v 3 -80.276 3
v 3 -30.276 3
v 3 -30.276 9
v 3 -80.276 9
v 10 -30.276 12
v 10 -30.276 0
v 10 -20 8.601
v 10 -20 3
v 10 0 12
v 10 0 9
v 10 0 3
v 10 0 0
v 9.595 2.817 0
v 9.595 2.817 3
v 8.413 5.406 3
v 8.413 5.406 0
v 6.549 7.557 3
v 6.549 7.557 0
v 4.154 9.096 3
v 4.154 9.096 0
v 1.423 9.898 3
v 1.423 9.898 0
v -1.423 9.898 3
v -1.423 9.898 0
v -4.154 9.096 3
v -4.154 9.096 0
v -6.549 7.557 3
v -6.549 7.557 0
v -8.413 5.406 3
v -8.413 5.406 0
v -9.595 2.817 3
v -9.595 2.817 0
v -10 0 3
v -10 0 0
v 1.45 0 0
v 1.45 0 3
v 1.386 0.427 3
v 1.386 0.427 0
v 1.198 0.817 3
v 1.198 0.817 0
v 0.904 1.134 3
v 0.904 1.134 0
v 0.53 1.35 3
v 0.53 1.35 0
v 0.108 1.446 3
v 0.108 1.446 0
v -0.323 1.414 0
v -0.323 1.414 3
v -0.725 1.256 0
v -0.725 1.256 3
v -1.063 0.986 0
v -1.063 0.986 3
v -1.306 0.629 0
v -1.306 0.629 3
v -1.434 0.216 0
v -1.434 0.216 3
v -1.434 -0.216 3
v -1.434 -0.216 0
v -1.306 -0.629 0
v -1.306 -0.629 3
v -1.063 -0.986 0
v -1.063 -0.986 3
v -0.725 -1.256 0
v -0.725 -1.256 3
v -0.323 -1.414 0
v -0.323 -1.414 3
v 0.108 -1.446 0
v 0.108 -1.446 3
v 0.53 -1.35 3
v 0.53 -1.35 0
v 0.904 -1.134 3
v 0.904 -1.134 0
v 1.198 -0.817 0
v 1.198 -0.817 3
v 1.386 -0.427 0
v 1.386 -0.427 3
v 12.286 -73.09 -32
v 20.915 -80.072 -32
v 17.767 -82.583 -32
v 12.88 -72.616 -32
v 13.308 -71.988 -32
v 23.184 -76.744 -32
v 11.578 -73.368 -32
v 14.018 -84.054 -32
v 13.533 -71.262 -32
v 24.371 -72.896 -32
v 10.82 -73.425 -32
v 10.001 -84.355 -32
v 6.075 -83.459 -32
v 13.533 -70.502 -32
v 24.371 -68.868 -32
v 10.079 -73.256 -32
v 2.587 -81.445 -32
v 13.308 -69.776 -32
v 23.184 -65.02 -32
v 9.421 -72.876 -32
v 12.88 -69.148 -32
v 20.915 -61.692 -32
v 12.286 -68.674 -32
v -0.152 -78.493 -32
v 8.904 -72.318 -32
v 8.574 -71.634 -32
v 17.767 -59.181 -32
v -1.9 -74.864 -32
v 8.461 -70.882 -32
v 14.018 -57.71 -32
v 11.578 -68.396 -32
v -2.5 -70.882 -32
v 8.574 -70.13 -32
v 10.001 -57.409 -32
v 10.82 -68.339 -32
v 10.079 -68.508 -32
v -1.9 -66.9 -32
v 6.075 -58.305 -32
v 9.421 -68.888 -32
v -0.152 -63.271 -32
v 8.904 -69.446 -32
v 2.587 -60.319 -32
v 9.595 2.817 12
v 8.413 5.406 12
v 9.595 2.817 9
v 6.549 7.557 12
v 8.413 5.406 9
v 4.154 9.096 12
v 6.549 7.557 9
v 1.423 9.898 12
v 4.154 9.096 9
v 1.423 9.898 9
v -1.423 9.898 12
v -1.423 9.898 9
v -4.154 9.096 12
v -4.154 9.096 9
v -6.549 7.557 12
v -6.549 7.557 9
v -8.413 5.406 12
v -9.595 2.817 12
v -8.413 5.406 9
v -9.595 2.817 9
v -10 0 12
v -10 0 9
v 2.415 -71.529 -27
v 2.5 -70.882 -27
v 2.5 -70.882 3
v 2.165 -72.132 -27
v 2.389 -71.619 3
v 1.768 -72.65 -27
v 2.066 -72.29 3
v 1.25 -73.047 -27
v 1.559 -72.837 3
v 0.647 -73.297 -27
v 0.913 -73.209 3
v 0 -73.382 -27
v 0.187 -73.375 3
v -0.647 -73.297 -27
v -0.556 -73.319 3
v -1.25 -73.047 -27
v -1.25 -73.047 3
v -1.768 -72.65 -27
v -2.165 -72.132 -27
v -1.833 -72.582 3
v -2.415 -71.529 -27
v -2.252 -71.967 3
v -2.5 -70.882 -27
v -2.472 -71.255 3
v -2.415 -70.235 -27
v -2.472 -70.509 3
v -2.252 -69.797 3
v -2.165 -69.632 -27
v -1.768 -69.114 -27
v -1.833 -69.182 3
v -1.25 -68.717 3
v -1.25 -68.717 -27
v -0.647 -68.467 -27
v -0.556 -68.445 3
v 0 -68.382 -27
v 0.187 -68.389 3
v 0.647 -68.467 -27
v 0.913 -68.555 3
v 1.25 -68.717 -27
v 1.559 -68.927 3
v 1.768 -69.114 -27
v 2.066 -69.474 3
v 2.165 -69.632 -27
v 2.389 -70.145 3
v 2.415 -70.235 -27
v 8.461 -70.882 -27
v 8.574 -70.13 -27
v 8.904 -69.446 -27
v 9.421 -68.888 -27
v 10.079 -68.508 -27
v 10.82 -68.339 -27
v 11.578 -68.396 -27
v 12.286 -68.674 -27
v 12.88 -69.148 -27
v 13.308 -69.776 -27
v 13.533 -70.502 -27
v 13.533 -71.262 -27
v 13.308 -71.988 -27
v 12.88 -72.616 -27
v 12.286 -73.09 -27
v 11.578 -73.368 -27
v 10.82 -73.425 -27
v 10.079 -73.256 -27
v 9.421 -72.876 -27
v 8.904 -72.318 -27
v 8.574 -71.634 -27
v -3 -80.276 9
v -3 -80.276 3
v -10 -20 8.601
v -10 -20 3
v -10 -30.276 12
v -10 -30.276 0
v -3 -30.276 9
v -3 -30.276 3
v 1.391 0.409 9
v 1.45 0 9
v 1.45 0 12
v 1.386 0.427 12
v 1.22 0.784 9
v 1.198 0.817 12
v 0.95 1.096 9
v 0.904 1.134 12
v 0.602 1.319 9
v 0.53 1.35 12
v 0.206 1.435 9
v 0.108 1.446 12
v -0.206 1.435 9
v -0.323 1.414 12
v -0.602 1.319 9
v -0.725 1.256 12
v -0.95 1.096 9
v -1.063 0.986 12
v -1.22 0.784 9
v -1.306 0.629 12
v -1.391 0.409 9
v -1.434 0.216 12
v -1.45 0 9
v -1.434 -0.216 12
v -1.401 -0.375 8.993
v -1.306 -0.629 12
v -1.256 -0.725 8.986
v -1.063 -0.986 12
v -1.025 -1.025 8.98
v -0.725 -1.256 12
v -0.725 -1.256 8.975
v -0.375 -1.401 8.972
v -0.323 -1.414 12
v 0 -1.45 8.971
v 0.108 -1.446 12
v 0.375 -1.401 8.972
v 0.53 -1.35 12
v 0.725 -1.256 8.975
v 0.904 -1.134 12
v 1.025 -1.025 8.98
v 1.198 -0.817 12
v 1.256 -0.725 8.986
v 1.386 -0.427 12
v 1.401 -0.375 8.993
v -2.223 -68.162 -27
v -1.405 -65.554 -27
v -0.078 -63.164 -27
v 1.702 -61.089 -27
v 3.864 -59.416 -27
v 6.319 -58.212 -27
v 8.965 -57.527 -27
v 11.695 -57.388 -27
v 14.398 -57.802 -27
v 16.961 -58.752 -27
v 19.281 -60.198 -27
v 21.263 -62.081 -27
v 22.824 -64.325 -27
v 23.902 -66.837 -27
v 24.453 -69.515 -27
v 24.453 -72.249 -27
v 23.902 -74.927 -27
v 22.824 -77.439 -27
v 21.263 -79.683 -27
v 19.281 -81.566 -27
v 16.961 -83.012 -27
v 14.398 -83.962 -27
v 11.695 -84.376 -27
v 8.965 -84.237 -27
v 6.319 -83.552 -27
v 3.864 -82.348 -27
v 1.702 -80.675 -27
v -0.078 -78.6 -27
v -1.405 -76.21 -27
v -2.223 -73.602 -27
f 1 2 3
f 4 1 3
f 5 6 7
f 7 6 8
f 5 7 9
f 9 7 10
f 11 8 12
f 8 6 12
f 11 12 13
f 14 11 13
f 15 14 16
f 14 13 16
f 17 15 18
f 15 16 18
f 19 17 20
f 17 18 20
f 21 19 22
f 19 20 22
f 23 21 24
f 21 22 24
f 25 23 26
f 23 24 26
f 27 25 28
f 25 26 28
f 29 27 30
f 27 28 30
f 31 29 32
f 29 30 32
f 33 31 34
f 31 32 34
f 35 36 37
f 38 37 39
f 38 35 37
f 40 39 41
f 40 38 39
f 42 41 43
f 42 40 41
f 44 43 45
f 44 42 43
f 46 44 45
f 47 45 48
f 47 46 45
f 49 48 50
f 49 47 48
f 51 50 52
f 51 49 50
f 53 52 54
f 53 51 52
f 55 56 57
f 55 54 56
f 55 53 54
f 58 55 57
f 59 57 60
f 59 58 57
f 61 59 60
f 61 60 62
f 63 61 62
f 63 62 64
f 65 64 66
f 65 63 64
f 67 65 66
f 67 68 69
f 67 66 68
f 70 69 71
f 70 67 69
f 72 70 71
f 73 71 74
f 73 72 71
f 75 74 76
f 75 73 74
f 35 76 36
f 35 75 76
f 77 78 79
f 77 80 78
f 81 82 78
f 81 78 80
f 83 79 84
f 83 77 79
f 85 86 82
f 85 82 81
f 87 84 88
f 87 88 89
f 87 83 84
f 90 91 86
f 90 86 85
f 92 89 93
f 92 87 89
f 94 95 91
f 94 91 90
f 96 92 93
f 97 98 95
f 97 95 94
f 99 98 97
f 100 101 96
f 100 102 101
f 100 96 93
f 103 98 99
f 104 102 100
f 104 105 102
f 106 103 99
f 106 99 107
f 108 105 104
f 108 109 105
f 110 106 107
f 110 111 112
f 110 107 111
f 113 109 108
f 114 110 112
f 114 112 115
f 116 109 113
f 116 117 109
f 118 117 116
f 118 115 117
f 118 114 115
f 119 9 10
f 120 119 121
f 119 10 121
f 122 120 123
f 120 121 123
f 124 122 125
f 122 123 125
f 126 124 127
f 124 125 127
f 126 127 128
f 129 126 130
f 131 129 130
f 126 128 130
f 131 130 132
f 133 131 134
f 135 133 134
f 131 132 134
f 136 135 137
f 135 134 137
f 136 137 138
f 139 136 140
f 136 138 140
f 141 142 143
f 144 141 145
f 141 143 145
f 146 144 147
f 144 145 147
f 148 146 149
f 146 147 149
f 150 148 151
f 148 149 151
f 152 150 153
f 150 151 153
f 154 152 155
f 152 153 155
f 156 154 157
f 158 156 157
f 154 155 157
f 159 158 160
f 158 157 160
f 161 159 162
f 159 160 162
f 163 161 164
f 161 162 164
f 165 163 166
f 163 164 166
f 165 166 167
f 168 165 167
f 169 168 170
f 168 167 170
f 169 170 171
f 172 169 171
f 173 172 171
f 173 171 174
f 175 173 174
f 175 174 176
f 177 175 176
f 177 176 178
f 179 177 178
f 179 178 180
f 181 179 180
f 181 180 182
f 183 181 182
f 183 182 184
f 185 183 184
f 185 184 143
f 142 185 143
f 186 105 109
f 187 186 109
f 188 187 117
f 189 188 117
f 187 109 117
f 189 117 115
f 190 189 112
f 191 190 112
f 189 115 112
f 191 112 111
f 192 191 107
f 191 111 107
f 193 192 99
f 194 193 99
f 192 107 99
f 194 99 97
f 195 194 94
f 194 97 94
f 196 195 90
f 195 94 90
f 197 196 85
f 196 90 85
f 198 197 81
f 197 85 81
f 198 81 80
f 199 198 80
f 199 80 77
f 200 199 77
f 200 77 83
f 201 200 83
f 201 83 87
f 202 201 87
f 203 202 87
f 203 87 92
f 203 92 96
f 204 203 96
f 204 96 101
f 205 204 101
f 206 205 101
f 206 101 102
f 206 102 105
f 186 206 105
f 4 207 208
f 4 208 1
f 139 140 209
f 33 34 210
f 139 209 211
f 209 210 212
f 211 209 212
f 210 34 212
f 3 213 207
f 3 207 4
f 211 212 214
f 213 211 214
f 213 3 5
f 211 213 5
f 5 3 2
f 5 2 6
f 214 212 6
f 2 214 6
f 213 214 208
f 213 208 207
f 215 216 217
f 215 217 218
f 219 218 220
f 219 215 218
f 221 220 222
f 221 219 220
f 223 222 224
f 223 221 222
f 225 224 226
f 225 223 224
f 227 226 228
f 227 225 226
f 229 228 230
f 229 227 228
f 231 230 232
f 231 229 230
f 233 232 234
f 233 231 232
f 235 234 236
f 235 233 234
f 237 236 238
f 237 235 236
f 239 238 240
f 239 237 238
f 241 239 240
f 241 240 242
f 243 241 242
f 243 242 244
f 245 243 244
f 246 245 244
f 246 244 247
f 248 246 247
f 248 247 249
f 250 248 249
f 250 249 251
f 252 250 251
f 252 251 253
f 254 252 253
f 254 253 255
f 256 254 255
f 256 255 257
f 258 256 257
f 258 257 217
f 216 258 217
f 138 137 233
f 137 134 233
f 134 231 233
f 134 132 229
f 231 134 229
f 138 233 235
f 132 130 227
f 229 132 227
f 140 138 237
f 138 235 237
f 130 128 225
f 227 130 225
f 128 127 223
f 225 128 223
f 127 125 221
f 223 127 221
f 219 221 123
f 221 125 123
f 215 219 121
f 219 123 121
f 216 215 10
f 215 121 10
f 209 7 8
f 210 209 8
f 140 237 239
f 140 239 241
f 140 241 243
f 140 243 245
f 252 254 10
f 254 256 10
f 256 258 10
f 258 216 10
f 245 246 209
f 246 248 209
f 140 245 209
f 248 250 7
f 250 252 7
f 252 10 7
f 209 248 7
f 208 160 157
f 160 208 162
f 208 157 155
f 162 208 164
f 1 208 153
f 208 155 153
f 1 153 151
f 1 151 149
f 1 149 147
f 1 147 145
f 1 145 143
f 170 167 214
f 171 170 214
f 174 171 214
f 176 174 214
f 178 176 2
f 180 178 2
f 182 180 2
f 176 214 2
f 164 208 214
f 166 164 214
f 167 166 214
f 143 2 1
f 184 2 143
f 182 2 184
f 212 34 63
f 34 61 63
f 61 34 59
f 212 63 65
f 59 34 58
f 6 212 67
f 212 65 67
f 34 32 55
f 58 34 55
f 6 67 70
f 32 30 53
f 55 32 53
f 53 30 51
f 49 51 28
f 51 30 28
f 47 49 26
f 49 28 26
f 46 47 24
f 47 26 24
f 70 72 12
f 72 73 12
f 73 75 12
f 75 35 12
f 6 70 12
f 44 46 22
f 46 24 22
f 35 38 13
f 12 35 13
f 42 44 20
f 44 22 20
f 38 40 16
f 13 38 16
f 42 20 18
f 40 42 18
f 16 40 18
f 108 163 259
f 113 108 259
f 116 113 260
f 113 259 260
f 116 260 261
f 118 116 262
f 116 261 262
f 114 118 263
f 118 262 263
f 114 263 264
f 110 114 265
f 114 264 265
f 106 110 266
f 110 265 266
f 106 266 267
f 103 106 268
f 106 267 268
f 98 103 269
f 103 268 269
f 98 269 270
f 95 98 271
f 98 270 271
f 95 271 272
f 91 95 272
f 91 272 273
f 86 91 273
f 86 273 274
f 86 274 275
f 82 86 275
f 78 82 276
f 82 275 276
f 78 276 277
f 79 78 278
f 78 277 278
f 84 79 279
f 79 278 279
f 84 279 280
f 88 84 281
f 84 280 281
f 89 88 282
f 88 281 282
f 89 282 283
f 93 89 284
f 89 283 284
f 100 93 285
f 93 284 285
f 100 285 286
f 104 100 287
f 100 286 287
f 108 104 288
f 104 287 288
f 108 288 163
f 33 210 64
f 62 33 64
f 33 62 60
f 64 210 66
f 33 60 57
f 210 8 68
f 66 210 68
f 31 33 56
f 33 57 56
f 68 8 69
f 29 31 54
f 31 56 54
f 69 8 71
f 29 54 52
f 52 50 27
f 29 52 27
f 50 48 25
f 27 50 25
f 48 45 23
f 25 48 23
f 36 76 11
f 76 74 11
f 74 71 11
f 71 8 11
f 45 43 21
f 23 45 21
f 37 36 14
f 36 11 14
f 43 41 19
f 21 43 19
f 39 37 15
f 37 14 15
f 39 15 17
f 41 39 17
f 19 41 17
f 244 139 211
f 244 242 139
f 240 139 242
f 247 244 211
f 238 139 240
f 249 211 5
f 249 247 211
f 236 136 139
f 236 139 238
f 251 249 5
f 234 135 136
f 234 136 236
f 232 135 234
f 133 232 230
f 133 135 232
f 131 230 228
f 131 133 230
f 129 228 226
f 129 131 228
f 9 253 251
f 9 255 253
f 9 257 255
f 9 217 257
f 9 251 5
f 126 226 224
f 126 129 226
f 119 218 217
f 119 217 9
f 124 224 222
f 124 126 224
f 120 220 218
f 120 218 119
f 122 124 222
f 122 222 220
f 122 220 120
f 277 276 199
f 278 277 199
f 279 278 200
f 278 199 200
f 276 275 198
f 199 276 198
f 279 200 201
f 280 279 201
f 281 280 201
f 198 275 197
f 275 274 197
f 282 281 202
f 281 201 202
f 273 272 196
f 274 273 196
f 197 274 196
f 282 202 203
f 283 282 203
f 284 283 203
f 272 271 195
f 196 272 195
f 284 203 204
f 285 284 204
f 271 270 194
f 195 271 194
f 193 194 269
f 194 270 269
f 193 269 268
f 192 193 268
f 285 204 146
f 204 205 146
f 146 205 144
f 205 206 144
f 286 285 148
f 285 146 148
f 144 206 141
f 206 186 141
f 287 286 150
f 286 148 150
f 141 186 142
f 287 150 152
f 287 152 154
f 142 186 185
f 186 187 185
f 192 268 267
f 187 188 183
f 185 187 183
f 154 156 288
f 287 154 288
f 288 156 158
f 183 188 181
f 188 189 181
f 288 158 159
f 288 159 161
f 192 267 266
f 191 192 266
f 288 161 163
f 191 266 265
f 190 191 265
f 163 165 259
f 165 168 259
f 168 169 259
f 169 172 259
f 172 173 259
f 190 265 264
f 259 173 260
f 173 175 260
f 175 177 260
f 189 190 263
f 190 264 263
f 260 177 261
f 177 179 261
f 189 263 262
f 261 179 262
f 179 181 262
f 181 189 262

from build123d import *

# Parameters (mm, degrees)
SKETCH_1_R          = 1.45
EXTRUDE_1_DEPTH     = 12
CUT_EXTRUDE_1_DEPTH = 39.218600963
SKETCH_3_W          = 6
SKETCH_3_H          = 6
EXTRUDE_5_DEPTH     = 50
EXTRUDE_6_DEPTH     = 30
SKETCH_9_R          = 13.511017451
EXTRUDE_10_DEPTH    = 5
SKETCH_10_R         = 2.55
CUT_EXTRUDE_5_DEPTH = 99.282815089


with BuildPart() as part:
    # 草圖1 → 填料-伸長1 (new body)
    with BuildSketch(Plane.XY):
        with BuildLine():
            Line((-10, 0), (-10, -30.276417548))
            Line((-10, -30.276417548), (10, -30.276417548))
            Line((10, -30.276417548), (10, 0))
            ThreePointArc((10, 0), (0, 10), (-10, 0))
        make_face()
        Circle(SKETCH_1_R, mode=Mode.SUBTRACT)
    extrude(amount=EXTRUDE_1_DEPTH)

    # 草圖2 → 除料-伸長1 (cut, through all)
    with BuildSketch(Plane(origin=(10, 0, 0), x_dir=(0, 0, -1), z_dir=(1, 0, 0))):
        Polygon((-9, 0), (-6, 0), (-3, 0), (-3, 15.780779257), (-9, 15.780779257), align=None)
        Polygon((-3, 0), (-6, 0), (-9, 0), (-8.60053373, -20), (-3, -20), align=None)
    extrude(amount=-CUT_EXTRUDE_1_DEPTH, mode=Mode.SUBTRACT)

    # 草圖3 → 填料-伸長5 (add)
    with BuildSketch(Plane.XZ.offset(30.276417548)):
        with Locations((0, 6)):
            Rectangle(SKETCH_3_W, SKETCH_3_H)
    extrude(amount=EXTRUDE_5_DEPTH)

    # 草圖8 → 填料-伸長6 (add)
    with BuildSketch(Plane(origin=(0, 0, 3), x_dir=(-1, 0, 0), z_dir=(0, 0, -1))):
        with BuildLine():
            ThreePointArc((2.5, -70.882000899), (0, -68.382000899), (-2.5, -70.882000899))
            Line((-2.5, -70.882000899), (2.5, -70.882000899))
        make_face()
        with BuildLine():
            Line((2.5, -70.882000899), (-2.5, -70.882000899))
            ThreePointArc((-2.5, -70.882000899), (0, -73.382000899), (2.5, -70.882000899))
        make_face()
    extrude(amount=EXTRUDE_6_DEPTH)

    # 草圖9 → 填料-伸長10 (add)
    with BuildSketch(Plane(origin=(0, 0, -27), x_dir=(-1, 0, 0), z_dir=(0, 0, -1))):
        with Locations((-11.011017451, -70.882000899)):
            Circle(SKETCH_9_R)
    extrude(amount=EXTRUDE_10_DEPTH)

    # 草圖10 → 除料-伸長5 (cut, through all)
    with BuildSketch(Plane(origin=(0, 0, -32), x_dir=(-1, 0, 0), z_dir=(0, 0, -1))):
        with Locations((-11.011017451, -70.882000899)):
            Circle(SKETCH_10_R)
    extrude(amount=-CUT_EXTRUDE_5_DEPTH, mode=Mode.SUBTRACT)


solid = part.part
